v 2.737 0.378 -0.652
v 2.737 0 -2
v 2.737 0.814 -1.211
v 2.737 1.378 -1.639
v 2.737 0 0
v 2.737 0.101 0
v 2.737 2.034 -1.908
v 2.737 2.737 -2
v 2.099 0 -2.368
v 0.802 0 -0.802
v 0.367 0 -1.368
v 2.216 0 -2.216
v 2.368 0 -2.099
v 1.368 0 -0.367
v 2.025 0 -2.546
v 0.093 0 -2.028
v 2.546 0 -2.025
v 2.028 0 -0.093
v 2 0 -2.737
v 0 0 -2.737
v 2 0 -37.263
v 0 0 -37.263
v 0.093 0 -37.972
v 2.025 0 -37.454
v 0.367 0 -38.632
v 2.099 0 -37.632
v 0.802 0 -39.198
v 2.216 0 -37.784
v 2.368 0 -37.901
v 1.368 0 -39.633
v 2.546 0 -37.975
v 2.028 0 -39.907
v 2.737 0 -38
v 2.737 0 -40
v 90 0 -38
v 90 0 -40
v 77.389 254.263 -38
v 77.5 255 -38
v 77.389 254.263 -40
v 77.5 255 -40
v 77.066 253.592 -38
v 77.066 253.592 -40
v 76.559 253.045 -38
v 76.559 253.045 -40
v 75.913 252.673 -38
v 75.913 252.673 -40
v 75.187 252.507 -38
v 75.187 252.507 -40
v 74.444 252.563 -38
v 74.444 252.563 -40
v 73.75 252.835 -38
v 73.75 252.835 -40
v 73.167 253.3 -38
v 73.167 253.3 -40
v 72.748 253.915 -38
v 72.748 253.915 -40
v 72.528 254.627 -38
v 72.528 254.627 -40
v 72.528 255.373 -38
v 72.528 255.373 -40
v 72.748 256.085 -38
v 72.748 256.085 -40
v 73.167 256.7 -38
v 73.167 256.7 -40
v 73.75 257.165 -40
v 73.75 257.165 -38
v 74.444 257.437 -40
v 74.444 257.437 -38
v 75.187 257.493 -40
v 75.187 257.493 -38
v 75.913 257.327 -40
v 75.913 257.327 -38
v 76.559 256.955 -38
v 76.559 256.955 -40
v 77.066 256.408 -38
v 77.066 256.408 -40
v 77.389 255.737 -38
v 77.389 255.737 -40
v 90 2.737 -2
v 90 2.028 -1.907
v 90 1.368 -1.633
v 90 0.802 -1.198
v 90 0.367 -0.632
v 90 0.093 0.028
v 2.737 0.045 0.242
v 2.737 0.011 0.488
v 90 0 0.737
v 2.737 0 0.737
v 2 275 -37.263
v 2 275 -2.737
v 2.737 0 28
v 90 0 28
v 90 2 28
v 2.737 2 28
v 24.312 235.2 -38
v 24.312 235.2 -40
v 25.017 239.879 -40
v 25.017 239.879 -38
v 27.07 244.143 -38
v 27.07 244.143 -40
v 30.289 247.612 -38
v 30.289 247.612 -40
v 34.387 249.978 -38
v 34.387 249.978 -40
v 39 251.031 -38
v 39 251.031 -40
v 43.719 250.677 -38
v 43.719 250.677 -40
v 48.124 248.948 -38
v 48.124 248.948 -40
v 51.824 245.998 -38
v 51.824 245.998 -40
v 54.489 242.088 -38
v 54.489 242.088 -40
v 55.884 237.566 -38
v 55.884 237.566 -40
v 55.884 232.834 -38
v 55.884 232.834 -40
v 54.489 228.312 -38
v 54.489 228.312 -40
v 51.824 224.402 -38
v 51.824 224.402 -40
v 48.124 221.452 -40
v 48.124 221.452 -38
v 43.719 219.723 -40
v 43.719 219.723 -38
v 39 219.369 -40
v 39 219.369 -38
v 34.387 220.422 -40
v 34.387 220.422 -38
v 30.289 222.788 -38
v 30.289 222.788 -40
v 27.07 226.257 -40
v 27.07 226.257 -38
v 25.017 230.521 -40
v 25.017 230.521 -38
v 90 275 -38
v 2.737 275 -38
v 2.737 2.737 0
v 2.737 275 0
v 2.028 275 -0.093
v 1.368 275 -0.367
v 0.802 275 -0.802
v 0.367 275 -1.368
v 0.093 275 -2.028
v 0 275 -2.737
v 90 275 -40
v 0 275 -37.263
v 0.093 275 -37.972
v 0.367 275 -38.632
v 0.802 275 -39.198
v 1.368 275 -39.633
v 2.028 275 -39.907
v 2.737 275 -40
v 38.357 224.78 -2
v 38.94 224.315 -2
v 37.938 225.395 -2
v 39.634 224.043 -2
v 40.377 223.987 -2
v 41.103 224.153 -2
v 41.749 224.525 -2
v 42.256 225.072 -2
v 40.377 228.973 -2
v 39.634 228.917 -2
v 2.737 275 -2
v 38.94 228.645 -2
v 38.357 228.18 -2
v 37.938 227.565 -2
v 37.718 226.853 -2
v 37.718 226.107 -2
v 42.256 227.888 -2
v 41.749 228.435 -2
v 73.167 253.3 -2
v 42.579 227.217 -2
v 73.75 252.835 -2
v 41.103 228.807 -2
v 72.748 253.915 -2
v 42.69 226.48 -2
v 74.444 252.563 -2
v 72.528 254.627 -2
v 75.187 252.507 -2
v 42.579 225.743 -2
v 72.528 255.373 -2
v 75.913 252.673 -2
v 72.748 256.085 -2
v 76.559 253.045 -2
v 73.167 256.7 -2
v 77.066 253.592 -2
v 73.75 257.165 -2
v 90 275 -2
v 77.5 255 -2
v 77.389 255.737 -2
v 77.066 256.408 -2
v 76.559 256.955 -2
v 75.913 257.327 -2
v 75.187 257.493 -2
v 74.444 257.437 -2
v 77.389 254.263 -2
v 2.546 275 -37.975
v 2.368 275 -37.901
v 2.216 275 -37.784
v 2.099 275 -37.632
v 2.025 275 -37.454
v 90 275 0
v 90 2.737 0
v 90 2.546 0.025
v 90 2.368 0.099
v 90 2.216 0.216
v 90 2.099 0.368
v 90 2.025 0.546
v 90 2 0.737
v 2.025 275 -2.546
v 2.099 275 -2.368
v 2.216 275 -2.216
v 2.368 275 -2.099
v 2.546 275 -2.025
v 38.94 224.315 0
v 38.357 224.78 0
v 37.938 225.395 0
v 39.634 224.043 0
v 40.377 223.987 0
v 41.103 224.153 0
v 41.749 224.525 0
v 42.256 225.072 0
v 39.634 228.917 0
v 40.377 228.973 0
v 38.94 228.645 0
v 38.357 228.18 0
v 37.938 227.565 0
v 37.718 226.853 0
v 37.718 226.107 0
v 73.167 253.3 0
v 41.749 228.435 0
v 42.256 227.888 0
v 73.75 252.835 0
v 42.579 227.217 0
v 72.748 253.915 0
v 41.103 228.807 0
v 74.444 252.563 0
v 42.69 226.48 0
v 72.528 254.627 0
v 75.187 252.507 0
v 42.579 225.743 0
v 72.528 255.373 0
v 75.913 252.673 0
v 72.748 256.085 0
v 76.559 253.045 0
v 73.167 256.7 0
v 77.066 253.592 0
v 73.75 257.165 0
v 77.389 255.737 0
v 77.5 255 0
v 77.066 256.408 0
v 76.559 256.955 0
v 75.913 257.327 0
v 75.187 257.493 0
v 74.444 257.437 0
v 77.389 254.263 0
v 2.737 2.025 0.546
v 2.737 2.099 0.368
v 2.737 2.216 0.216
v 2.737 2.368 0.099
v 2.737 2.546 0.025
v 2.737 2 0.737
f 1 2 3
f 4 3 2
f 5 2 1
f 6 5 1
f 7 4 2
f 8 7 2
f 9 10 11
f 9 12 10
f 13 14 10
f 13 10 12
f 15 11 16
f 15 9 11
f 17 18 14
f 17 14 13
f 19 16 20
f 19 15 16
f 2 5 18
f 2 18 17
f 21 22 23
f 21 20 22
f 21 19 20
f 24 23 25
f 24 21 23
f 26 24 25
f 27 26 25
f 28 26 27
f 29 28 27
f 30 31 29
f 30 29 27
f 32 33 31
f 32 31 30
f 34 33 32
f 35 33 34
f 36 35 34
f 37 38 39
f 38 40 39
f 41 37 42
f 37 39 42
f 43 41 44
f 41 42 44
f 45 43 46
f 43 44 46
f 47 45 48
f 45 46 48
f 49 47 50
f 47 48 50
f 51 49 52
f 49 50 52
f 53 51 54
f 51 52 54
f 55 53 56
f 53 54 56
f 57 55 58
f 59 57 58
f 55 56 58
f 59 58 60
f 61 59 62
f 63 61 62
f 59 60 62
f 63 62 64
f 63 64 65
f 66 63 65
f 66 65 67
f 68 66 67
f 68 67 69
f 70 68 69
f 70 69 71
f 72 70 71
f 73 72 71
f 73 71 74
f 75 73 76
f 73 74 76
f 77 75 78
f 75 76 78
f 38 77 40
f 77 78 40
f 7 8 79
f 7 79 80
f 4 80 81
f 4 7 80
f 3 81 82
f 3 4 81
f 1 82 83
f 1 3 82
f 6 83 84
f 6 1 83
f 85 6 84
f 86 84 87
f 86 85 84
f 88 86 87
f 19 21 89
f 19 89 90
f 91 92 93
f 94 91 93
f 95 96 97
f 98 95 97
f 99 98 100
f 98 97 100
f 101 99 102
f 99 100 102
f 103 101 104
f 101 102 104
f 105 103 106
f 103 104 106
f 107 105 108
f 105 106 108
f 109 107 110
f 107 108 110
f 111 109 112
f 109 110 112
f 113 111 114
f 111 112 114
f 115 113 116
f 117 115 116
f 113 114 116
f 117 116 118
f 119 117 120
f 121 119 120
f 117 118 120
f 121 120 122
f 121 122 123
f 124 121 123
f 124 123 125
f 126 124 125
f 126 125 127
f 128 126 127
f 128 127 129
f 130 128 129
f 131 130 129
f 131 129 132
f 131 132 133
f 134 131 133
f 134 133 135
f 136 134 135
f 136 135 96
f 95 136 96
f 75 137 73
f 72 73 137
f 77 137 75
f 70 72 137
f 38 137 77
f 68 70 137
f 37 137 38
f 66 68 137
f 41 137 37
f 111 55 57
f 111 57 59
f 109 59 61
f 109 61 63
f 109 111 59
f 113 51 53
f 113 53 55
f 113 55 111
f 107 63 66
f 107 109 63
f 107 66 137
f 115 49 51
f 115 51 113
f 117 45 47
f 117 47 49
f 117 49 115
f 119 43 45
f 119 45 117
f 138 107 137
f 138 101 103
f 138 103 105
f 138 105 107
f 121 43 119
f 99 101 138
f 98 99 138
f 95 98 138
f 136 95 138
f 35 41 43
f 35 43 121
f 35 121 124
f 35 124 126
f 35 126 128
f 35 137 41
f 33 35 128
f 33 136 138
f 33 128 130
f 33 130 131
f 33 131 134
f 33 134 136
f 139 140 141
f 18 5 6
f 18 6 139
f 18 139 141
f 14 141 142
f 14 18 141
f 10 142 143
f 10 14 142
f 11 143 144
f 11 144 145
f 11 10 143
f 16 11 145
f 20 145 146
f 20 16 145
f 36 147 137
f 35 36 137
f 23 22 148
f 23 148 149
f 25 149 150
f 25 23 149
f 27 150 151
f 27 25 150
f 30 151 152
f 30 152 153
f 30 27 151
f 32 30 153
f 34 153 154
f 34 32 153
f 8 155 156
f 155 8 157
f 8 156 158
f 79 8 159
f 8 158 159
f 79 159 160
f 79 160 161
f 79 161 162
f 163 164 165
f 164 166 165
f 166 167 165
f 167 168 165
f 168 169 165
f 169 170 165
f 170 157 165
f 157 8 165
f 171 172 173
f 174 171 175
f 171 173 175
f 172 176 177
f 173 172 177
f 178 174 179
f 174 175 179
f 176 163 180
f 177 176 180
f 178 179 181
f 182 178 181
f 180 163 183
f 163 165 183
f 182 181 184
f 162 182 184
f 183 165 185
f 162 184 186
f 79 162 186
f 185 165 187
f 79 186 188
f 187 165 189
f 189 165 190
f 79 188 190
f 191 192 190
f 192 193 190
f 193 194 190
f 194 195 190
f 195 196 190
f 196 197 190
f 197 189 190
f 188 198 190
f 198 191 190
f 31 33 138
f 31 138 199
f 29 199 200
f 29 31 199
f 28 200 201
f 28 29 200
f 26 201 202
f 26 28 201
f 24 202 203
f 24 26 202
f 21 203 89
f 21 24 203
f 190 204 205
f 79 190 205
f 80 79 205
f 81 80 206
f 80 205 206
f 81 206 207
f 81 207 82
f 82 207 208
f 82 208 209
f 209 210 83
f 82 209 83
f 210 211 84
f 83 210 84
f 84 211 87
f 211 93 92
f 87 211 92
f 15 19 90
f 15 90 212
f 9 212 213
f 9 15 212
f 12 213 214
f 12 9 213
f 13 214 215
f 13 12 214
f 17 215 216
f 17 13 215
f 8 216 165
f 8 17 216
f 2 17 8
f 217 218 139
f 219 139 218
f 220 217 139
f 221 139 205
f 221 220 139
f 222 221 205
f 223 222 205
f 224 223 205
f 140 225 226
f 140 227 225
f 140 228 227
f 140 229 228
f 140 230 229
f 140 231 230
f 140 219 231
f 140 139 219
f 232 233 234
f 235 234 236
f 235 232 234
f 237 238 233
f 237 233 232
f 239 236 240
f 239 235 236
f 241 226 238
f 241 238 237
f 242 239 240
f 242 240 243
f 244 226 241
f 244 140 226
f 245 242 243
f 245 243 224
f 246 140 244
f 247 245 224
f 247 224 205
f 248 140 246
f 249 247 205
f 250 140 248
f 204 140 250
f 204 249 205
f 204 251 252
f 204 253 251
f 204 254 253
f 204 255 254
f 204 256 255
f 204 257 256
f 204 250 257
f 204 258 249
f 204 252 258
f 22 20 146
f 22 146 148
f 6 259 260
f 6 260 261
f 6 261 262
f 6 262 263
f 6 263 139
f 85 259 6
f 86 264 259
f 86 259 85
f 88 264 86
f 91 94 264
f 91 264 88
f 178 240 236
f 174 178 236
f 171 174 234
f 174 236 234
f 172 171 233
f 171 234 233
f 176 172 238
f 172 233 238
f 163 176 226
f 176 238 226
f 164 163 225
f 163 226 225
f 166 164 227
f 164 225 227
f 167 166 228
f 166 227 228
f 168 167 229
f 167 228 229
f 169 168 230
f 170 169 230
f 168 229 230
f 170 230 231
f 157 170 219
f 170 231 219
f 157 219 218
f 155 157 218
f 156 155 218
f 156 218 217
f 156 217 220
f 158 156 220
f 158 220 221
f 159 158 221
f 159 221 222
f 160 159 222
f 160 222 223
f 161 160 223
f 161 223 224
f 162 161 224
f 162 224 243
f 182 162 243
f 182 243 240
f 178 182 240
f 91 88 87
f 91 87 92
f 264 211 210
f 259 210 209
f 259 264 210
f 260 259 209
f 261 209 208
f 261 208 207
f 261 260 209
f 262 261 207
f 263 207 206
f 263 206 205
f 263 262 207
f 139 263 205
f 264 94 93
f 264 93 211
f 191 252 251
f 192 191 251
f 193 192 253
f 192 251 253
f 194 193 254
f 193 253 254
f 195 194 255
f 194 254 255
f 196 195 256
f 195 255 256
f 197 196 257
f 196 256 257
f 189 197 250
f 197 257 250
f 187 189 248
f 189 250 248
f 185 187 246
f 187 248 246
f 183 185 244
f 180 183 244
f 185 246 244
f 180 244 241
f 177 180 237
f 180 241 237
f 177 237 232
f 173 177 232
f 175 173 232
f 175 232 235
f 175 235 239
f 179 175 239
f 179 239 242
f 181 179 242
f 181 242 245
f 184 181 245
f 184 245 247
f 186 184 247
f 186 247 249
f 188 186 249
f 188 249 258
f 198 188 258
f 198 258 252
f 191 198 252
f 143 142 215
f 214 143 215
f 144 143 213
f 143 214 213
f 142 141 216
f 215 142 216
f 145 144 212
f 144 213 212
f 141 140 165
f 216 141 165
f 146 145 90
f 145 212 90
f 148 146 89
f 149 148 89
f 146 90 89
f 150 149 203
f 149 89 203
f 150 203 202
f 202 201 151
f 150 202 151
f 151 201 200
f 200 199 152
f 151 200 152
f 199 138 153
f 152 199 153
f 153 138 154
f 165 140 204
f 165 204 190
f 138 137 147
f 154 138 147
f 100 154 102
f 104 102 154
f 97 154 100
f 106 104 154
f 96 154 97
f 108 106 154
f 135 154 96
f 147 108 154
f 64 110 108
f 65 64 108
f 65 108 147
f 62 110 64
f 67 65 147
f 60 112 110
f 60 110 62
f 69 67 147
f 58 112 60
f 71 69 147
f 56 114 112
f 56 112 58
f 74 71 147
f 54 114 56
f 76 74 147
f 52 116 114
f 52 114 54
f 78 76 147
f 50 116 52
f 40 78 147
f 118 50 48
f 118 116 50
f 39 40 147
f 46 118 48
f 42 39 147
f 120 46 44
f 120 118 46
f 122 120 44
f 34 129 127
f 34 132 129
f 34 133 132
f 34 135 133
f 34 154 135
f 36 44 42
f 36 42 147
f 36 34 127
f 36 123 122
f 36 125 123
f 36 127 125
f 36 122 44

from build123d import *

# Parameters (mm, degrees)
SKETCH1_W                    = 90
SKETCH1_H                    = 275
BASE_FLANGE1_DEPTH           = 2
EDGE_FLANGE1_STRIP_W         = 9.4732
EDGE_FLANGE1_STRIP_H         = 2
EDGE_FLANGE1_STRIP_CUT_DEPTH = 275
EDGE_FLANGE1_DEPTH           = 275
EDGE_FLANGE2_STRIP_W         = 9.4732
EDGE_FLANGE2_STRIP_H         = 2
EDGE_FLANGE2_STRIP_CUT_DEPTH = 275
EDGE_FLANGE2_DEPTH           = 275
EDGE_FLANGE3_STRIP_W         = 9.4732
EDGE_FLANGE3_STRIP_H         = 2
EDGE_FLANGE3_STRIP_CUT_DEPTH = 87.2634
EDGE_FLANGE3_DEPTH           = 87.2634
CUT_EXTRUDE2_REACH           = 294.104
SKETCH18_R                   = 2.5
CUT_EXTRUDE1_REACH           = 299.236
SKETCH17_R                   = 15.875
SKETCH17_R_2                 = 2.5


# Sheet-metal steps are written as plain solids
with BuildPart() as part:
    # Sketch1 → Base-Flange1 (new body)
    with BuildSketch(Plane.XY):
        with Locations((45, 137.5)):
            Rectangle(SKETCH1_W, SKETCH1_H)
    extrude(amount=-BASE_FLANGE1_DEPTH)

    # Edge-Flange1 strip (across the edge) → Edge-Flange1 strip cut (cut)
    with BuildSketch(Plane(origin=(0, 0, -2), x_dir=(1, 0, 0), z_dir=(0, 1, 0))):
        with Locations((-2, -1)):
            Rectangle(EDGE_FLANGE1_STRIP_W, EDGE_FLANGE1_STRIP_H)
    extrude(amount=EDGE_FLANGE1_STRIP_CUT_DEPTH, mode=Mode.SUBTRACT)

    # Edge-Flange1 section (across the edge) → Edge-Flange1 (add)
    with BuildSketch(Plane(origin=(0, 0, -2), x_dir=(1, 0, 0), z_dir=(0, 1, 0))):
        with BuildLine():
            Line((0, 0.7366), (0, 38))
            Line((0, 38), (2, 38))
            Line((2, 38), (2, 0.7366))
            ThreePointArc((2, 0.7366), (2.215745145, 0.215745145), (2.7366, 0))
            Line((2.7366, 0), (2.7366, -2))
            ThreePointArc((2.7366, -2), (0.801531583, -1.198468417), (0, 0.7366))
        make_face()
    extrude(amount=EDGE_FLANGE1_DEPTH)

    # Edge-Flange2 strip (across the edge) → Edge-Flange2 strip cut (cut)
    with BuildSketch(Plane(origin=(2, 0, -40), x_dir=(0, 0, 1), z_dir=(0, 1, 0))):
        with Locations((-2, -1)):
            Rectangle(EDGE_FLANGE2_STRIP_W, EDGE_FLANGE2_STRIP_H)
    extrude(amount=EDGE_FLANGE2_STRIP_CUT_DEPTH, mode=Mode.SUBTRACT)

    # Edge-Flange2 section (across the edge) → Edge-Flange2 (add)
    with BuildSketch(Plane(origin=(2, 0, -40), x_dir=(0, 0, 1), z_dir=(0, 1, 0))):
        with BuildLine():
            Line((0, 0.7366), (0, 88))
            Line((0, 88), (2, 88))
            Line((2, 88), (2, 0.7366))
            ThreePointArc((2, 0.7366), (2.215745145, 0.215745145), (2.7366, 0))
            Line((2.7366, 0), (2.7366, -2))
            ThreePointArc((2.7366, -2), (0.801531583, -1.198468417), (0, 0.7366))
        make_face()
    extrude(amount=EDGE_FLANGE2_DEPTH)

    # Edge-Flange3 strip (across the edge) → Edge-Flange3 strip cut (cut)
    with BuildSketch(Plane.YZ.offset(2.7366)):
        with Locations((-2, -1)):
            Rectangle(EDGE_FLANGE3_STRIP_W, EDGE_FLANGE3_STRIP_H)
    extrude(amount=EDGE_FLANGE3_STRIP_CUT_DEPTH, mode=Mode.SUBTRACT)

    # Edge-Flange3 section (across the edge) → Edge-Flange3 (add)
    with BuildSketch(Plane.YZ.offset(2.7366)):
        with BuildLine():
            Line((0, 0.7366), (0, 28))
            Line((0, 28), (2, 28))
            Line((2, 28), (2, 0.7366))
            ThreePointArc((2, 0.7366), (2.215745145, 0.215745145), (2.7366, 0))
            Line((2.7366, 0), (2.7366, -2))
            ThreePointArc((2.7366, -2), (0.801531583, -1.198468417), (0, 0.7366))
        make_face()
    extrude(amount=EDGE_FLANGE3_DEPTH)

    # Sketch18 → Cut-Extrude2 (cut, up to next)
    with BuildSketch(Plane.XY, mode=Mode.PRIVATE) as cut_extrude2_sk1:
        with Locations((40.19, 226.48)):
            Circle(SKETCH18_R)
    cut_extrude2_tool1 = extrude(cut_extrude2_sk1.sketch, amount=-CUT_EXTRUDE2_REACH, mode=Mode.PRIVATE) & part.part
    # Sketch18 → Cut-Extrude2 (cut, up to next)
    with BuildSketch(Plane.XY, mode=Mode.PRIVATE) as cut_extrude2_sk2:
        with Locations((75, 255)):
            Circle(SKETCH18_R)
    cut_extrude2_tool2 = extrude(cut_extrude2_sk2.sketch, amount=-CUT_EXTRUDE2_REACH, mode=Mode.PRIVATE) & part.part
    add(cut_extrude2_tool1.solids().sort_by_distance((40.19, 226.48, 0))[0], mode=Mode.SUBTRACT)
    add(cut_extrude2_tool2.solids().sort_by_distance((75, 255, 0))[0], mode=Mode.SUBTRACT)

    # Sketch17 → Cut-Extrude1 (cut, up to next)
    with BuildSketch(Plane(origin=(0, 0, -40), x_dir=(-1, 0, 0), z_dir=(0, 0, -1)), mode=Mode.PRIVATE) as cut_extrude1_sk1:
        with Locations((-40.1866, 235.2)):
            Circle(SKETCH17_R)
    cut_extrude1_tool1 = extrude(cut_extrude1_sk1.sketch, amount=-CUT_EXTRUDE1_REACH, mode=Mode.PRIVATE) & part.part
    # Sketch17 → Cut-Extrude1 (cut, up to next)
    with BuildSketch(Plane(origin=(0, 0, -40), x_dir=(-1, 0, 0), z_dir=(0, 0, -1)), mode=Mode.PRIVATE) as cut_extrude1_sk2:
        with Locations(Location((-75, 255, 0), (0, 0, 180))):
            Circle(SKETCH17_R_2)
    cut_extrude1_tool2 = extrude(cut_extrude1_sk2.sketch, amount=-CUT_EXTRUDE1_REACH, mode=Mode.PRIVATE) & part.part
    add(cut_extrude1_tool1.solids().sort_by_distance((40.1866, 235.2, -40))[0], mode=Mode.SUBTRACT)
    add(cut_extrude1_tool2.solids().sort_by_distance((75, 255, -40))[0], mode=Mode.SUBTRACT)


solid = part.part
